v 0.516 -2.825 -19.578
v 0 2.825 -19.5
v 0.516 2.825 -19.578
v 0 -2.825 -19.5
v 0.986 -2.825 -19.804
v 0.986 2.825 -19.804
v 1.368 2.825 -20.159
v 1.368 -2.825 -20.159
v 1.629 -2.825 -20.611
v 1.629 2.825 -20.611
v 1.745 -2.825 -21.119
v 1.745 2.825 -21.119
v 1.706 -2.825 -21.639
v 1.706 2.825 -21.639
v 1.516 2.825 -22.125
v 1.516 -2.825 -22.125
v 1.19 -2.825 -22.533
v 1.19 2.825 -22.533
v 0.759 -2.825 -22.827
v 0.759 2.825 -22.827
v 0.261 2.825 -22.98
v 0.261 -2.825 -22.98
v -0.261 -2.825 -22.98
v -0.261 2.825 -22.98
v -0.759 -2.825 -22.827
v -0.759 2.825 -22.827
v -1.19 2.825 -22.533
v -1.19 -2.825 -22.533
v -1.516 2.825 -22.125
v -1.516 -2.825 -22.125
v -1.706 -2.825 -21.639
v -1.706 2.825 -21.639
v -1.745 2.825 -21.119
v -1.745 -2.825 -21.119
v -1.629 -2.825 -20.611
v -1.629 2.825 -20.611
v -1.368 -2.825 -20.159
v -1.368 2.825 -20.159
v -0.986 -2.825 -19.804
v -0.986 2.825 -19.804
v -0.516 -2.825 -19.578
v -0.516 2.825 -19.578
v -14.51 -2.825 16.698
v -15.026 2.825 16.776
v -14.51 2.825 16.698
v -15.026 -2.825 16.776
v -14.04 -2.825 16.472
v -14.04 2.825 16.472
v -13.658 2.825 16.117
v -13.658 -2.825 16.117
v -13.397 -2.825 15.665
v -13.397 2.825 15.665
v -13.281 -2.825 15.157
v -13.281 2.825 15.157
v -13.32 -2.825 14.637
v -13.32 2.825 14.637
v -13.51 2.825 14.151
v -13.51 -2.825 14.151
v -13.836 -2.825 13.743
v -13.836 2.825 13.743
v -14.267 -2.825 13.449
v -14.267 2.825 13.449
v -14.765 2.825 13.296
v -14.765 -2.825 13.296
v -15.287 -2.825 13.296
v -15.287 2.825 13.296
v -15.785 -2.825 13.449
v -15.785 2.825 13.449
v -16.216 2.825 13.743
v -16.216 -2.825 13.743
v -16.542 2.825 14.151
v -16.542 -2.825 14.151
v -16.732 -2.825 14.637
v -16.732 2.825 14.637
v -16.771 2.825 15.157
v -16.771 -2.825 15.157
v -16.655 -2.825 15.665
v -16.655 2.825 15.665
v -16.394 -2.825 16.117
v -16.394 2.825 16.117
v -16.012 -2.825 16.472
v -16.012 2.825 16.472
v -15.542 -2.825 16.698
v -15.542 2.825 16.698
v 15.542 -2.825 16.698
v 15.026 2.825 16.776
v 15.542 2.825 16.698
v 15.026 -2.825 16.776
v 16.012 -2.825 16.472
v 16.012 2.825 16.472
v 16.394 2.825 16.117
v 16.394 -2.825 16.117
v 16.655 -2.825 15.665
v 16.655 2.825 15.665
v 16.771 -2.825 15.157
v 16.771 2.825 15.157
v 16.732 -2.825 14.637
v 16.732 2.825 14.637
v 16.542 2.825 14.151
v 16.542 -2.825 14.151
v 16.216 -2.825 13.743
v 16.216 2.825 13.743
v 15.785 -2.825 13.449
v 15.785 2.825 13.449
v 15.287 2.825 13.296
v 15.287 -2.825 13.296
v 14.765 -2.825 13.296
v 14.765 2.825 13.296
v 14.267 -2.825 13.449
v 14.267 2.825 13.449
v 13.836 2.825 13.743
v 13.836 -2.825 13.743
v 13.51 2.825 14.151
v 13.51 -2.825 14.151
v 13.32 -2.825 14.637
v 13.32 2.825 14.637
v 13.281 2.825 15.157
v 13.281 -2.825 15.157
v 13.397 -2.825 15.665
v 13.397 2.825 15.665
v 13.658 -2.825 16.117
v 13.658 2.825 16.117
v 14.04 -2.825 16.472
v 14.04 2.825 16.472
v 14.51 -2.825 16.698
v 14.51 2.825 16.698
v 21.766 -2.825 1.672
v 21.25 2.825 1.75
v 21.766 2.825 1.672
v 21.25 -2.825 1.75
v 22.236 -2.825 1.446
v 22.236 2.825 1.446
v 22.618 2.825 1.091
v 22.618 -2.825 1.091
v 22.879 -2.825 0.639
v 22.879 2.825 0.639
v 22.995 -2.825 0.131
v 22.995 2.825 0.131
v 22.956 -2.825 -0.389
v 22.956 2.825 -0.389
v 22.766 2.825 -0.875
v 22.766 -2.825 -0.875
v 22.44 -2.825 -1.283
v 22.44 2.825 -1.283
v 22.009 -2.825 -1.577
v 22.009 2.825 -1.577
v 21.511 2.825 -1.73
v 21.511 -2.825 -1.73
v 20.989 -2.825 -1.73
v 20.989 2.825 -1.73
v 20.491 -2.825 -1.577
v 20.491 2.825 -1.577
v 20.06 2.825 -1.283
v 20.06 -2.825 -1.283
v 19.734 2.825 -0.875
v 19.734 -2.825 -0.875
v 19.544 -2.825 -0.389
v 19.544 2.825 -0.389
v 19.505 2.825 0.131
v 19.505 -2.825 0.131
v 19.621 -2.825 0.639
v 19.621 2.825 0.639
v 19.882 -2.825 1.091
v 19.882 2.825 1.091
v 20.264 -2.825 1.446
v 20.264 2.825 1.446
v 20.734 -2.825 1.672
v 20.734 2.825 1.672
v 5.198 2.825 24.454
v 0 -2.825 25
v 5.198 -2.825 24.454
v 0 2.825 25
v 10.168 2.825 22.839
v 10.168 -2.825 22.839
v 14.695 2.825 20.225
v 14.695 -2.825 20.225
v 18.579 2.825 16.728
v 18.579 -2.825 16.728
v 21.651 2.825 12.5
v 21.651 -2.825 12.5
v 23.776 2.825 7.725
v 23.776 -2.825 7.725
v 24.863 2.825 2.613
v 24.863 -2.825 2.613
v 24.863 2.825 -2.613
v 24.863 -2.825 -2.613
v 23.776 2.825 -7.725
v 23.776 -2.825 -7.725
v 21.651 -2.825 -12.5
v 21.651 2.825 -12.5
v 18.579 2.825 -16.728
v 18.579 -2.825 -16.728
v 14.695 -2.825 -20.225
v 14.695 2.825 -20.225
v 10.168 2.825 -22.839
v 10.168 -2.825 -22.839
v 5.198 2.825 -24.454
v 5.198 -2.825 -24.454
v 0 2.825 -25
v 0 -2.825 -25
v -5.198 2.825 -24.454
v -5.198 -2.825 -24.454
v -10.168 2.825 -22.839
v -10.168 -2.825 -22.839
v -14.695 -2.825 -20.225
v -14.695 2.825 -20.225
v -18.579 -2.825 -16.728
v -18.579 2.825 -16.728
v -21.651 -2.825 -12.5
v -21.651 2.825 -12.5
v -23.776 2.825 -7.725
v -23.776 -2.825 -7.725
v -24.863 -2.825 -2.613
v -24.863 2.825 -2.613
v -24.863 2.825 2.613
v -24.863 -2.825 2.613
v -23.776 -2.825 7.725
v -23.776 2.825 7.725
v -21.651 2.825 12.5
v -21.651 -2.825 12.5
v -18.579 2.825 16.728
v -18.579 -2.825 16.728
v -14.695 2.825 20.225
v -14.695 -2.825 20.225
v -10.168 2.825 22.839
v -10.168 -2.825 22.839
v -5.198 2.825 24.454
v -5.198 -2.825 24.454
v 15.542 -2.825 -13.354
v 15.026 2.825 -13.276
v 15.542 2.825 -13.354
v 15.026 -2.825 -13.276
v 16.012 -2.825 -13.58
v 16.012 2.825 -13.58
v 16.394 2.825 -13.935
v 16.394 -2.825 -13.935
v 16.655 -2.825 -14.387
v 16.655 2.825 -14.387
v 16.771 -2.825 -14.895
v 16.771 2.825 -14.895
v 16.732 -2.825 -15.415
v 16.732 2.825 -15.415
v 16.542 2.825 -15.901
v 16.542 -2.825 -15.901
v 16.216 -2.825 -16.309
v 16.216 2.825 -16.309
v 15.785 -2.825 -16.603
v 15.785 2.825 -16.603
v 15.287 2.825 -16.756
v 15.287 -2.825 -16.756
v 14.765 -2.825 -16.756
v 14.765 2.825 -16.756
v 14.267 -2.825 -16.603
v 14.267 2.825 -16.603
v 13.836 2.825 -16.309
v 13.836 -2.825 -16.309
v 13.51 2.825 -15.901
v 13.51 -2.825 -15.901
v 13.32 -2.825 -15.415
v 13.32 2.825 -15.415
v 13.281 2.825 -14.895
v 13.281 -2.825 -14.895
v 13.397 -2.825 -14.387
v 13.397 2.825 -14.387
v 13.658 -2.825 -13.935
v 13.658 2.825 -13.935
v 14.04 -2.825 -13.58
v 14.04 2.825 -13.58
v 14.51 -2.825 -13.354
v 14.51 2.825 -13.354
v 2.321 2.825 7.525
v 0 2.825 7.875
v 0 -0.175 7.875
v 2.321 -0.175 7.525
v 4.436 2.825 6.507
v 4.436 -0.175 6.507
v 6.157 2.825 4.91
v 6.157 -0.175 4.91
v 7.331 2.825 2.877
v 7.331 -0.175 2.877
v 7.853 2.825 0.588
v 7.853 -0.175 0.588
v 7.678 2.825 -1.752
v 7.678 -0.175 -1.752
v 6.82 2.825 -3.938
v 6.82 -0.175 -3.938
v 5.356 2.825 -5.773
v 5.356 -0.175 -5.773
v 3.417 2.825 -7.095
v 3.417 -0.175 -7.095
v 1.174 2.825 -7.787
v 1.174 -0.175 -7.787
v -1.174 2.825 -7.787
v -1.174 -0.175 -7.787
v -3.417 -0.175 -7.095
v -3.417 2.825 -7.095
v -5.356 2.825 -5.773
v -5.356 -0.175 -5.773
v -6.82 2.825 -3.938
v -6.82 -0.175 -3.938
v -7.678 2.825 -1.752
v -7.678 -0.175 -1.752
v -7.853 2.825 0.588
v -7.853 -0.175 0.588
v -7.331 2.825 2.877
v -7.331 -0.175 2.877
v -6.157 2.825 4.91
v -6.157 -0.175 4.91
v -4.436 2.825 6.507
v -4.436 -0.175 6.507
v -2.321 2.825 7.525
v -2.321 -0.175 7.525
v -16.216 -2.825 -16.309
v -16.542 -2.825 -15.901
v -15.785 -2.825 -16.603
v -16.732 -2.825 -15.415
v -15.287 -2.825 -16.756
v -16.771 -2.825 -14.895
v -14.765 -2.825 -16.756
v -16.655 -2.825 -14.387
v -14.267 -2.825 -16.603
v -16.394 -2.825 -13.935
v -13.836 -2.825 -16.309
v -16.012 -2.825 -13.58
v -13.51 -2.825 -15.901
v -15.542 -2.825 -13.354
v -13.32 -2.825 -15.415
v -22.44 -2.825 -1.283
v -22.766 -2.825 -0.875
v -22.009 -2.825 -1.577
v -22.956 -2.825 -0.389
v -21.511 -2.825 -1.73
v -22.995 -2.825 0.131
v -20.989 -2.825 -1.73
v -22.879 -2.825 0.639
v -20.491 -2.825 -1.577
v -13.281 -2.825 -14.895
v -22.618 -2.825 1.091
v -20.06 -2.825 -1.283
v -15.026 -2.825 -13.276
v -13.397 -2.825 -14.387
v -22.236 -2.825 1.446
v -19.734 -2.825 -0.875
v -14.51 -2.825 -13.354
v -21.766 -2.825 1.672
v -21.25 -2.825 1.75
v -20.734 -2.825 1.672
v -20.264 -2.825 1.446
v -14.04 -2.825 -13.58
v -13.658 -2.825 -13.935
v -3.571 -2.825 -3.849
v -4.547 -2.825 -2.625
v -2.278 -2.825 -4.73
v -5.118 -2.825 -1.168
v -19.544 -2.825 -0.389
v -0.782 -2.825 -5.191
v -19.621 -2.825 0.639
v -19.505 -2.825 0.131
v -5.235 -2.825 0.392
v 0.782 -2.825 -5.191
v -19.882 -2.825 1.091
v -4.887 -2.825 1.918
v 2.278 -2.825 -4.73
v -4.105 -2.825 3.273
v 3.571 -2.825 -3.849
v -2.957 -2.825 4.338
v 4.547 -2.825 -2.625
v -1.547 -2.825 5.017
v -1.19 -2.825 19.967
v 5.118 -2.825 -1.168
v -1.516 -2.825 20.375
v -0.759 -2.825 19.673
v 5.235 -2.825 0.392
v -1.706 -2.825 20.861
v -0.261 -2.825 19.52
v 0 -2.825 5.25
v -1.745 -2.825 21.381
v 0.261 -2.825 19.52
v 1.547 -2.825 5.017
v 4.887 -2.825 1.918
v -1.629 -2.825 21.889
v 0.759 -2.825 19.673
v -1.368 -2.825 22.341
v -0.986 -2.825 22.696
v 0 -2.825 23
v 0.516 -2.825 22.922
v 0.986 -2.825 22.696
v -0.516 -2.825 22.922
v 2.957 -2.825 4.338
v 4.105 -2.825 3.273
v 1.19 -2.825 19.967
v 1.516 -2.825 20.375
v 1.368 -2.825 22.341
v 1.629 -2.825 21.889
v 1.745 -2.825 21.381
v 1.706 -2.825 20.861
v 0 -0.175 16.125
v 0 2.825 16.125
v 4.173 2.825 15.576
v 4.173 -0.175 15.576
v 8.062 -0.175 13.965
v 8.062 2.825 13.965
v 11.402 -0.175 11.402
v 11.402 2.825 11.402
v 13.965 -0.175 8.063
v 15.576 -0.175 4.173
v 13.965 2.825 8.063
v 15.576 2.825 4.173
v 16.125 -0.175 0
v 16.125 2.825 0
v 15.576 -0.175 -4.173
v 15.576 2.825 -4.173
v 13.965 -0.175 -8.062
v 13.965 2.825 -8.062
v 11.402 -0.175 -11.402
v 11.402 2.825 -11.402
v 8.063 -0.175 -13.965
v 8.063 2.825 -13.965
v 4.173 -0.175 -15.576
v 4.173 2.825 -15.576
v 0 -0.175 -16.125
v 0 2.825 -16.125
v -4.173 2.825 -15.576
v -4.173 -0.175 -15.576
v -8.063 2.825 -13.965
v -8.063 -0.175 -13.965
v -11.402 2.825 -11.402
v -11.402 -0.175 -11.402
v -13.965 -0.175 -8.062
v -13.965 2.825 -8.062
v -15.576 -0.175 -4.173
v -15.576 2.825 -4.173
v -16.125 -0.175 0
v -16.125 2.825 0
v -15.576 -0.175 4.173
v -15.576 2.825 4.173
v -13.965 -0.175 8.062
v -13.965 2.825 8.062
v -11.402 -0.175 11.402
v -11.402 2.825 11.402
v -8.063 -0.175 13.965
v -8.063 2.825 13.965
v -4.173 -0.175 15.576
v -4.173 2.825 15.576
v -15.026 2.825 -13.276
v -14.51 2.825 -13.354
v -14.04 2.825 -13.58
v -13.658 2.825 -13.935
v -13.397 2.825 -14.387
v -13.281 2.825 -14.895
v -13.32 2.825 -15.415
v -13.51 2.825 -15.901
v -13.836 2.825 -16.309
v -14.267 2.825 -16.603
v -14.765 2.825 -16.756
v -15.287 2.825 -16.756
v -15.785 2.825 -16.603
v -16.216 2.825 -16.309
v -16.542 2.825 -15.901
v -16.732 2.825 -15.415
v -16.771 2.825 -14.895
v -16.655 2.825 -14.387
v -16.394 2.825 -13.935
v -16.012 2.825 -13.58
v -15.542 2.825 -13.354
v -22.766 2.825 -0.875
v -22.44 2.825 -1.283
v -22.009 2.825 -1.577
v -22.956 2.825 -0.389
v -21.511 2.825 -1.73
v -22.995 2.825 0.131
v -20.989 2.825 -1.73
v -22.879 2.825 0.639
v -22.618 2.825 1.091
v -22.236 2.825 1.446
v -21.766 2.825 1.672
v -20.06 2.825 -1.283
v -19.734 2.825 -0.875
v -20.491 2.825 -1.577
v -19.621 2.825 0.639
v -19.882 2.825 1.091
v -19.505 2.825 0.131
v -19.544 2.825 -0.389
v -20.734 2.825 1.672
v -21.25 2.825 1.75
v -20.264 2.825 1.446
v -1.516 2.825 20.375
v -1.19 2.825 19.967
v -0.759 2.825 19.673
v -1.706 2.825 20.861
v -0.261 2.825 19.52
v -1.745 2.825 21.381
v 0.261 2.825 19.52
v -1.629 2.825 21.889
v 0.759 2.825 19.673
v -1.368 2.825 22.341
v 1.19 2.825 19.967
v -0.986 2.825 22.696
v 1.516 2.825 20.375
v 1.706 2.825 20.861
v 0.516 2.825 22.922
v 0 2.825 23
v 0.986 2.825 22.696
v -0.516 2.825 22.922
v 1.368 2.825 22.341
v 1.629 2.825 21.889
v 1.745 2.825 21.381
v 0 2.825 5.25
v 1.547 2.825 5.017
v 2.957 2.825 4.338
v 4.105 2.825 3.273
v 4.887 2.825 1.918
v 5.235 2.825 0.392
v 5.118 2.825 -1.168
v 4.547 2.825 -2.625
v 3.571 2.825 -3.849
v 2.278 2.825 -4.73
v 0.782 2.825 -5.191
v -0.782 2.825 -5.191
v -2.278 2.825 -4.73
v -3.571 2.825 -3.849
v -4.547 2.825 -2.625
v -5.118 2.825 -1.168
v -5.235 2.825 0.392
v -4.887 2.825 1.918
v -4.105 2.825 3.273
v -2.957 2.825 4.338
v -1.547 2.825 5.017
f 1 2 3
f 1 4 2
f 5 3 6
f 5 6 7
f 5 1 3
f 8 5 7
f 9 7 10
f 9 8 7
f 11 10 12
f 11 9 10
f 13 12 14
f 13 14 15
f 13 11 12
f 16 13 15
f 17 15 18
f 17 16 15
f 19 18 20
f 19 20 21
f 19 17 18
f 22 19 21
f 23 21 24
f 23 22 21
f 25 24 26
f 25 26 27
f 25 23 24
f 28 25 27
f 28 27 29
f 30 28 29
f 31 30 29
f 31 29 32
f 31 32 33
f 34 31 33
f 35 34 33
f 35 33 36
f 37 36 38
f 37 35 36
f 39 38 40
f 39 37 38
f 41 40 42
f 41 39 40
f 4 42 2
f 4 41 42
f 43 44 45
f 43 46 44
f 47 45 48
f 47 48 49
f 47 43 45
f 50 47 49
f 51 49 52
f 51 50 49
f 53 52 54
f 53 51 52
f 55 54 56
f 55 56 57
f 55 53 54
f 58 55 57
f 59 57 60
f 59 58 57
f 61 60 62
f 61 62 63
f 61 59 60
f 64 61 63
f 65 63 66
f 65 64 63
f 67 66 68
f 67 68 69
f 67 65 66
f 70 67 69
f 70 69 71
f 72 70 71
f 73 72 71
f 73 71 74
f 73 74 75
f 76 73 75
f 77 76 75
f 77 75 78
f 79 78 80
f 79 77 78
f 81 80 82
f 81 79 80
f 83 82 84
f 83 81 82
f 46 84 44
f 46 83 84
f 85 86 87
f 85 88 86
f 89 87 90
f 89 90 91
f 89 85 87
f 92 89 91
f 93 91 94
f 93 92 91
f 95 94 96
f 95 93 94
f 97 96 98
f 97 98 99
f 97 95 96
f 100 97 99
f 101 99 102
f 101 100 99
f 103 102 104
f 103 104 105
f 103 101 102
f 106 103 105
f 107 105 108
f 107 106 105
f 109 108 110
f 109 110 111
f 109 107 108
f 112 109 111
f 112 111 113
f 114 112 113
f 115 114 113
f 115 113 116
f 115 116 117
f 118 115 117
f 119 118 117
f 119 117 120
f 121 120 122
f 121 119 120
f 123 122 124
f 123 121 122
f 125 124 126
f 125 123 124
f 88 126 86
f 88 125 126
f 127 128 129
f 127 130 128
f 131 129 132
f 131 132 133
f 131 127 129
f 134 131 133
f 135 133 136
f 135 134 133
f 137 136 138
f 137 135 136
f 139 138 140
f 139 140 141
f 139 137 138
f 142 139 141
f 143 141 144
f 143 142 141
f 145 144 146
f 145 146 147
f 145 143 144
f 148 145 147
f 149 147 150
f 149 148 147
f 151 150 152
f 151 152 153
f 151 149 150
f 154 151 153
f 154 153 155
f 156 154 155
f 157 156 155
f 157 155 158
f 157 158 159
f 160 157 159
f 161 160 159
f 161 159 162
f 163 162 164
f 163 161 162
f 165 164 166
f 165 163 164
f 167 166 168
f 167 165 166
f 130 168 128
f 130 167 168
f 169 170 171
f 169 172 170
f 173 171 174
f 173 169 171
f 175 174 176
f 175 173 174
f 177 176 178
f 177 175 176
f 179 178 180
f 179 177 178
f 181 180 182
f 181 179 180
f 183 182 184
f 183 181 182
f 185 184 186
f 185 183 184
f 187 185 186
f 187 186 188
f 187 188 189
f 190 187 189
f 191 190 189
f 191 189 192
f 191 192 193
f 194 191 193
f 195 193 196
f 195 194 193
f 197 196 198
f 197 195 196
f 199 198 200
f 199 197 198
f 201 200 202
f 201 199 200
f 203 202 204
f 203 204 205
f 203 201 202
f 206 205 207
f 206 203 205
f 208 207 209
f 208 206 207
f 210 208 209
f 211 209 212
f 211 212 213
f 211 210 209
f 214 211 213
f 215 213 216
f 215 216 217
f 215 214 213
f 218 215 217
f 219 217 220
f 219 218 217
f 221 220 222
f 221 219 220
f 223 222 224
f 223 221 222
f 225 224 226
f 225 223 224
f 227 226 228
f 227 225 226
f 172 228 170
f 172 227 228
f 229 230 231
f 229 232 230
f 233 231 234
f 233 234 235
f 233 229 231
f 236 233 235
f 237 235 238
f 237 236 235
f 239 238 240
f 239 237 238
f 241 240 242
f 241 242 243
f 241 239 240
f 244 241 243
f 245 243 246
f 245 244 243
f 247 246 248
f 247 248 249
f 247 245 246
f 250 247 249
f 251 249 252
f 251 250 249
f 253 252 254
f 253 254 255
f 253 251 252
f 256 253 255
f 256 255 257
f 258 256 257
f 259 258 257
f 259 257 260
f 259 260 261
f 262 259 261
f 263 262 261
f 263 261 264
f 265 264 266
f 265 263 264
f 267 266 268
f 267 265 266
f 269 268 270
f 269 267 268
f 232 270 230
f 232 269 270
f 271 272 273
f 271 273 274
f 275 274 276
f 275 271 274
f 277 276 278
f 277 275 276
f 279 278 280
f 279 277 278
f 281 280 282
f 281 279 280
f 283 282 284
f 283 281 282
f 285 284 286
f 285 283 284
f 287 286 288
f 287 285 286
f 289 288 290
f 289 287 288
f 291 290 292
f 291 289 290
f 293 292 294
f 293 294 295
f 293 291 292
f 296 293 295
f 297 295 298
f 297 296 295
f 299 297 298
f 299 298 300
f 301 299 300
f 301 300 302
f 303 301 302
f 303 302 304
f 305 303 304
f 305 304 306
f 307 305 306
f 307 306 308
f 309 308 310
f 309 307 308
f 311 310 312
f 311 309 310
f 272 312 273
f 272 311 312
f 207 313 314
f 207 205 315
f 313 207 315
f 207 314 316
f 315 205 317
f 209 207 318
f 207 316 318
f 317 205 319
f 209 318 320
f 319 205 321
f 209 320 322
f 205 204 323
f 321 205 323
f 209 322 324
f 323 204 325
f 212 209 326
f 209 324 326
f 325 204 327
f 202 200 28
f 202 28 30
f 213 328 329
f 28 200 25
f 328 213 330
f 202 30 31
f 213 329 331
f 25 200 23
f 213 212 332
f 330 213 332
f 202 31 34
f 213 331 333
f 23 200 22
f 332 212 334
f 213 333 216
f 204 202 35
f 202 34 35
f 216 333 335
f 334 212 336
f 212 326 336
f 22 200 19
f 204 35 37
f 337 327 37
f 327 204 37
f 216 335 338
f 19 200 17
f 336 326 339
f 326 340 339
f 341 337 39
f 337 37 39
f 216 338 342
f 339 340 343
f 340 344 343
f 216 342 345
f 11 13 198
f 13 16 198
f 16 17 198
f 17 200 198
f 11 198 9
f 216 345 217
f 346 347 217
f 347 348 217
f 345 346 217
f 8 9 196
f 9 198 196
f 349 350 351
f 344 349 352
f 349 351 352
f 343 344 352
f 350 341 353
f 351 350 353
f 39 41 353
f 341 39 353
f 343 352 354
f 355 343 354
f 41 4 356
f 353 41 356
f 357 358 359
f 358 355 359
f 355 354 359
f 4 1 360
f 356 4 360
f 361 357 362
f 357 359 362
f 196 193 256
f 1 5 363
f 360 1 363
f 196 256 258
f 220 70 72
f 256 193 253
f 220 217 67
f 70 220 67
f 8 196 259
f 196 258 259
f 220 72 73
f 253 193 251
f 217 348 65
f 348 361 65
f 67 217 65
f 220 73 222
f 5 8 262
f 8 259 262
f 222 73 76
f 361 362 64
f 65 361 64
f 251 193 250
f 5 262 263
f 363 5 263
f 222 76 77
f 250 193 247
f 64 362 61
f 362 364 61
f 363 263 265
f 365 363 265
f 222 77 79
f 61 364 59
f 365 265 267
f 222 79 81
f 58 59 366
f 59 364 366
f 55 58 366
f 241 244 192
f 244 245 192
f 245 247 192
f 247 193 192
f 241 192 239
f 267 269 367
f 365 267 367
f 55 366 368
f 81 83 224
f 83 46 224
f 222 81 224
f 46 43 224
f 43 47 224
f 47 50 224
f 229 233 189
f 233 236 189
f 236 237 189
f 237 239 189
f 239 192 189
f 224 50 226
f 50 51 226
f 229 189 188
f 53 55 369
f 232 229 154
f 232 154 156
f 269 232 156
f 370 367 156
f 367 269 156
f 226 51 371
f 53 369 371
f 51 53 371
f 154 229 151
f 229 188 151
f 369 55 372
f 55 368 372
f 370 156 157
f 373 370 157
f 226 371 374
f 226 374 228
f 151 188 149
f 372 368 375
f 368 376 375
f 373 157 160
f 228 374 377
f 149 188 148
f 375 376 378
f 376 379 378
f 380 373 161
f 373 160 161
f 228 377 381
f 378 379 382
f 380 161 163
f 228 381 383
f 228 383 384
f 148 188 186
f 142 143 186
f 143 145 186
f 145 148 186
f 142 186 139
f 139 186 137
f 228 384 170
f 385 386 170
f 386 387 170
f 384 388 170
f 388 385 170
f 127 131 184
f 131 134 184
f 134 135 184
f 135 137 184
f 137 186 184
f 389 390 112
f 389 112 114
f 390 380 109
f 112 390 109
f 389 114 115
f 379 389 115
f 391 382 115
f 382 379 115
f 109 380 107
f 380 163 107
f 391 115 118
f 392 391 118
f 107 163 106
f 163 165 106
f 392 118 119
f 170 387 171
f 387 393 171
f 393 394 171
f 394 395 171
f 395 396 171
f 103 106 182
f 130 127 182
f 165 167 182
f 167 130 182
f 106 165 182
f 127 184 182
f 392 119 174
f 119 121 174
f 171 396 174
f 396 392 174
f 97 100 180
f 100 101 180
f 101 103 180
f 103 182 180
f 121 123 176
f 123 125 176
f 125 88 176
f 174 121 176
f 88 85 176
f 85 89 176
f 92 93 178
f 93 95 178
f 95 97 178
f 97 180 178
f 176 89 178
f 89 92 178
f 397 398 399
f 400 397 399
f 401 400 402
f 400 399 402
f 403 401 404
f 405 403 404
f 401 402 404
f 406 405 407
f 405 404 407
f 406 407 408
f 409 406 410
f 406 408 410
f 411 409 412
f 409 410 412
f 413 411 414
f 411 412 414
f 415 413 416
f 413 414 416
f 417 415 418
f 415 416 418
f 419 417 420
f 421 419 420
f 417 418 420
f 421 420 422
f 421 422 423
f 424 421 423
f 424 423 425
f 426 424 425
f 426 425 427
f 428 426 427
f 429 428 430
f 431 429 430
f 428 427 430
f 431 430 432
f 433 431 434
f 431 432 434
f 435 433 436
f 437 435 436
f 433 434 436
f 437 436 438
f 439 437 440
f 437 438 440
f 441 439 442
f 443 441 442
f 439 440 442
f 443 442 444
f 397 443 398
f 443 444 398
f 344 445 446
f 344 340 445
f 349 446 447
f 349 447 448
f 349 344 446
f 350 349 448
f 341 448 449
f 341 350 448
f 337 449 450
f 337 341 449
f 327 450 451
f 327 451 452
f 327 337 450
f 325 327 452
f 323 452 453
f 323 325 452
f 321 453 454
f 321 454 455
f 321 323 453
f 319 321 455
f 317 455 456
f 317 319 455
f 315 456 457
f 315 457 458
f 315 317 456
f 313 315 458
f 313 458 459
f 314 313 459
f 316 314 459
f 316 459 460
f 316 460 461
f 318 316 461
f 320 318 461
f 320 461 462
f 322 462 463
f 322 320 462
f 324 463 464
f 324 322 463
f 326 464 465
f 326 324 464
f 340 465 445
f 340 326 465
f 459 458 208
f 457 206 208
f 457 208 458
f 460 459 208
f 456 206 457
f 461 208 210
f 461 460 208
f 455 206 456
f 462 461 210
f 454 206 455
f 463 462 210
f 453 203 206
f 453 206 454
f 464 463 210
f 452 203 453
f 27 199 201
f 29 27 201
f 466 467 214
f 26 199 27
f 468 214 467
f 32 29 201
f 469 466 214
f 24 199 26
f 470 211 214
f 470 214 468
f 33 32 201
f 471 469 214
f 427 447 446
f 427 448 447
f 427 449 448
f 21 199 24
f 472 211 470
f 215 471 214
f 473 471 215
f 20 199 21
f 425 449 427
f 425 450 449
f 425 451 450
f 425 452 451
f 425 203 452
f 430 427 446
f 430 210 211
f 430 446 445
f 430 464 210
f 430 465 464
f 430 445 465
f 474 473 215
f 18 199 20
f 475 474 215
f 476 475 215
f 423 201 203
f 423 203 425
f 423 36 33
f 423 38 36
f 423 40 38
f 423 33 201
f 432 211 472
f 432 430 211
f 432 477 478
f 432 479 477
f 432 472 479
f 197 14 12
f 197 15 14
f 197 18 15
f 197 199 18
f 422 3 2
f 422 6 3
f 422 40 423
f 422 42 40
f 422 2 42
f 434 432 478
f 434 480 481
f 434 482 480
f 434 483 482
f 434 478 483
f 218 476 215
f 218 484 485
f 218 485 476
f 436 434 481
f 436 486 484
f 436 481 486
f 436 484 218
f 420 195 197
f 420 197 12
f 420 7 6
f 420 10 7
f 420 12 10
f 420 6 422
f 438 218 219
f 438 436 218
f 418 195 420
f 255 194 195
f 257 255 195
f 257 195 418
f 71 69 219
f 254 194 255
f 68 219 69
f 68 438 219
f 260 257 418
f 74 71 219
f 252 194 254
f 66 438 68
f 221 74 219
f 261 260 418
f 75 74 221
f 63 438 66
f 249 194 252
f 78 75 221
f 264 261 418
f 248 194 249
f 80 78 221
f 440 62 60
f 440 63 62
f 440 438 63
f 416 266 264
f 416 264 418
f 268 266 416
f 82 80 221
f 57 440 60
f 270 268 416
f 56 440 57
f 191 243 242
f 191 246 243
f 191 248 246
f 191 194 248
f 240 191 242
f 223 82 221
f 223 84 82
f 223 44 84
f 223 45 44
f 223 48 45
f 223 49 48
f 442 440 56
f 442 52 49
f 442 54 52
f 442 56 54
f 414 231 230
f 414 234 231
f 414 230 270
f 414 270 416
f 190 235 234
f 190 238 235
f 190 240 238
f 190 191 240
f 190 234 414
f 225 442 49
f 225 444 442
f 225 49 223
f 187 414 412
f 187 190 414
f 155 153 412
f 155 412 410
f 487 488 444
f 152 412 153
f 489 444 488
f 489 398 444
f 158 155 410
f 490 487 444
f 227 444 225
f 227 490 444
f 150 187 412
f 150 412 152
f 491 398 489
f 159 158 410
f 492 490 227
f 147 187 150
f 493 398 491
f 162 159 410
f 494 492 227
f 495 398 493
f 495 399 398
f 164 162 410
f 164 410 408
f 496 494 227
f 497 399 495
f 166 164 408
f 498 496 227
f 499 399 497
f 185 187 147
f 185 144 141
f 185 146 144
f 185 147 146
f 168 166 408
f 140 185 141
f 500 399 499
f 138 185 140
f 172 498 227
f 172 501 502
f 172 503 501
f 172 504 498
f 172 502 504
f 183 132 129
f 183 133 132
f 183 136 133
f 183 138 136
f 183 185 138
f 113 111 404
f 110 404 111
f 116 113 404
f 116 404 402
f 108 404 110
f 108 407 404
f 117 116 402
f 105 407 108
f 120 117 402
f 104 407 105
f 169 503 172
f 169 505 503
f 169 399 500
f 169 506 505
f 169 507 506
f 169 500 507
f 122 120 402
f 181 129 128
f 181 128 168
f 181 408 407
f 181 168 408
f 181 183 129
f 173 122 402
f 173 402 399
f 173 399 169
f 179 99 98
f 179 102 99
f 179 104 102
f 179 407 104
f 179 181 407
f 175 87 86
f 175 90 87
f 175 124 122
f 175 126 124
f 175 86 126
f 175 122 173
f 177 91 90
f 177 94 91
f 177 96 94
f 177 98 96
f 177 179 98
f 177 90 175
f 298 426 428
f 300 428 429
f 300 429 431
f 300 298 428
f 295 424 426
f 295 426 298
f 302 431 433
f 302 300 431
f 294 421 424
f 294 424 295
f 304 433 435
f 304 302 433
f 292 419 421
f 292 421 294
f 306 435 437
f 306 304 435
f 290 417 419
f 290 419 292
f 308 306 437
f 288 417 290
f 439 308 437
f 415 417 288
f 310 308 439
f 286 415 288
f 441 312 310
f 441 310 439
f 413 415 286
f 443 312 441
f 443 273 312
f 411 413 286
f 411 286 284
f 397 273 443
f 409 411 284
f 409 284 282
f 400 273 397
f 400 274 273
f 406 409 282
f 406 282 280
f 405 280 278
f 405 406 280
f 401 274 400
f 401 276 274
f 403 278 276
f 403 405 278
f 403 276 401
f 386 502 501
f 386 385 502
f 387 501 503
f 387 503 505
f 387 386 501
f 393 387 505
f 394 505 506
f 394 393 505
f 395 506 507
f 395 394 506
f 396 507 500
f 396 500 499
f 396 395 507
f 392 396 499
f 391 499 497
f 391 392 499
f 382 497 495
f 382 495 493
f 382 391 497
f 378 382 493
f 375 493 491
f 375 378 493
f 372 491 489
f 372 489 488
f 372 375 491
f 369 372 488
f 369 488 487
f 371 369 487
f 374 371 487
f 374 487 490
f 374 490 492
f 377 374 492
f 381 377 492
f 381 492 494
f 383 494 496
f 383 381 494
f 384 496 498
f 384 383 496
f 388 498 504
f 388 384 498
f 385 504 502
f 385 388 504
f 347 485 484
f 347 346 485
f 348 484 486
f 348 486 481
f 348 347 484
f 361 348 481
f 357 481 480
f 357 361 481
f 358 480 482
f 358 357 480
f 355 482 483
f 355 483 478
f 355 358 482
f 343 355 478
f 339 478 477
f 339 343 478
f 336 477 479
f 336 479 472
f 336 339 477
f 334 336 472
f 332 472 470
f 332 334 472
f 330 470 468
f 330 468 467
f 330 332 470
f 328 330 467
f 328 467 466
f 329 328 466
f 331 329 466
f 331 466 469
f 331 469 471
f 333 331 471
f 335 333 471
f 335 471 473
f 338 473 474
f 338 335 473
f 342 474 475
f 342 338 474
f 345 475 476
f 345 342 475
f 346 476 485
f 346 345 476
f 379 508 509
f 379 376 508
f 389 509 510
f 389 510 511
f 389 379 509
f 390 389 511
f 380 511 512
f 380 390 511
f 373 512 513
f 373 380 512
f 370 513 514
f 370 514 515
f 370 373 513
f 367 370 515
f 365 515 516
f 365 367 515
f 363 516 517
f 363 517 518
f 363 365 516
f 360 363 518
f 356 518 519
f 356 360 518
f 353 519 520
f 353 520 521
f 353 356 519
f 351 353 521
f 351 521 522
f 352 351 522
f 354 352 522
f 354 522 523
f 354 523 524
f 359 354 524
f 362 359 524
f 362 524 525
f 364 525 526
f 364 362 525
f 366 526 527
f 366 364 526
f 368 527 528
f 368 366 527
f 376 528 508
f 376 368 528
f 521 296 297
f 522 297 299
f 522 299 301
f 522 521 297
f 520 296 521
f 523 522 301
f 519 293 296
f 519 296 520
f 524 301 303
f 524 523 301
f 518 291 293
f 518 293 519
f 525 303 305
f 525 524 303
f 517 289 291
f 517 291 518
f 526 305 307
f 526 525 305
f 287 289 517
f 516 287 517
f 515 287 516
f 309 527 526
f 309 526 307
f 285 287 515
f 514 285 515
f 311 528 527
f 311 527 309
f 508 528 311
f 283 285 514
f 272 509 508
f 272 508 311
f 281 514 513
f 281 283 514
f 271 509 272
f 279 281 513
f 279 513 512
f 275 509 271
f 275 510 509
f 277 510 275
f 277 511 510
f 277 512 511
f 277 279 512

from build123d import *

# Parameters (mm, degrees)
SKETCH2_R           = 25
SKETCH2_R_2         = 5.25
SKETCH2_R_3         = 1.75
BOSS_EXTRUDE1_DEPTH = 2.825
SKETCH3_R           = 16.125
SKETCH3_R_2         = 7.875
CUT_EXTRUDE1_DEPTH  = 3


with BuildPart() as part:
    # Sketch2 → Boss-Extrude1 (new, symmetric)
    with BuildSketch(Plane(origin=(0, 0, 0), x_dir=(1, 0, 0), z_dir=(0, 1, 0))):
        with Locations(Location((0, 0, 0), (0, 0, 270))):
            Circle(SKETCH2_R)
        with Locations(Location((0, 0, 0), (0, 0, 270))):
            Circle(SKETCH2_R_2, mode=Mode.SUBTRACT)
        with Locations(Location((0, 21.25, 0), (0, 0, 270))):
            Circle(SKETCH2_R_3, mode=Mode.SUBTRACT)
        with Locations(Location((15.0260191, 15.0260191, 0), (0, 0, 270))):
            Circle(SKETCH2_R_3, mode=Mode.SUBTRACT)
        with Locations(Location((21.25, 0, 0), (0, 0, 270))):
            Circle(SKETCH2_R_3, mode=Mode.SUBTRACT)
        with Locations(Location((15.0260191, -15.0260191, 0), (0, 0, 270))):
            Circle(SKETCH2_R_3, mode=Mode.SUBTRACT)
        with Locations(Location((0, -21.25, 0), (0, 0, 270))):
            Circle(SKETCH2_R_3, mode=Mode.SUBTRACT)
        with Locations(Location((-15.0260191, -15.0260191, 0), (0, 0, 270))):
            Circle(SKETCH2_R_3, mode=Mode.SUBTRACT)
        with Locations(Location((-21.25, 0, 0), (0, 0, 270))):
            Circle(SKETCH2_R_3, mode=Mode.SUBTRACT)
        with Locations(Location((-15.0260191, 15.0260191, 0), (0, 0, 270))):
            Circle(SKETCH2_R_3, mode=Mode.SUBTRACT)
    extrude(amount=BOSS_EXTRUDE1_DEPTH, both=True)

    # Sketch3 → Cut-Extrude1 (cut)
    with BuildSketch(Plane(origin=(0, 2.825, 0), x_dir=(1, 0, 0), z_dir=(0, 1, 0))):
        with Locations(Location((0, 0, 0), (0, 0, 270))):
            Circle(SKETCH3_R)
        with Locations(Location((0, 0, 0), (0, 0, 270))):
            Circle(SKETCH3_R_2, mode=Mode.SUBTRACT)
    extrude(amount=-CUT_EXTRUDE1_DEPTH, mode=Mode.SUBTRACT)


solid = part.part
